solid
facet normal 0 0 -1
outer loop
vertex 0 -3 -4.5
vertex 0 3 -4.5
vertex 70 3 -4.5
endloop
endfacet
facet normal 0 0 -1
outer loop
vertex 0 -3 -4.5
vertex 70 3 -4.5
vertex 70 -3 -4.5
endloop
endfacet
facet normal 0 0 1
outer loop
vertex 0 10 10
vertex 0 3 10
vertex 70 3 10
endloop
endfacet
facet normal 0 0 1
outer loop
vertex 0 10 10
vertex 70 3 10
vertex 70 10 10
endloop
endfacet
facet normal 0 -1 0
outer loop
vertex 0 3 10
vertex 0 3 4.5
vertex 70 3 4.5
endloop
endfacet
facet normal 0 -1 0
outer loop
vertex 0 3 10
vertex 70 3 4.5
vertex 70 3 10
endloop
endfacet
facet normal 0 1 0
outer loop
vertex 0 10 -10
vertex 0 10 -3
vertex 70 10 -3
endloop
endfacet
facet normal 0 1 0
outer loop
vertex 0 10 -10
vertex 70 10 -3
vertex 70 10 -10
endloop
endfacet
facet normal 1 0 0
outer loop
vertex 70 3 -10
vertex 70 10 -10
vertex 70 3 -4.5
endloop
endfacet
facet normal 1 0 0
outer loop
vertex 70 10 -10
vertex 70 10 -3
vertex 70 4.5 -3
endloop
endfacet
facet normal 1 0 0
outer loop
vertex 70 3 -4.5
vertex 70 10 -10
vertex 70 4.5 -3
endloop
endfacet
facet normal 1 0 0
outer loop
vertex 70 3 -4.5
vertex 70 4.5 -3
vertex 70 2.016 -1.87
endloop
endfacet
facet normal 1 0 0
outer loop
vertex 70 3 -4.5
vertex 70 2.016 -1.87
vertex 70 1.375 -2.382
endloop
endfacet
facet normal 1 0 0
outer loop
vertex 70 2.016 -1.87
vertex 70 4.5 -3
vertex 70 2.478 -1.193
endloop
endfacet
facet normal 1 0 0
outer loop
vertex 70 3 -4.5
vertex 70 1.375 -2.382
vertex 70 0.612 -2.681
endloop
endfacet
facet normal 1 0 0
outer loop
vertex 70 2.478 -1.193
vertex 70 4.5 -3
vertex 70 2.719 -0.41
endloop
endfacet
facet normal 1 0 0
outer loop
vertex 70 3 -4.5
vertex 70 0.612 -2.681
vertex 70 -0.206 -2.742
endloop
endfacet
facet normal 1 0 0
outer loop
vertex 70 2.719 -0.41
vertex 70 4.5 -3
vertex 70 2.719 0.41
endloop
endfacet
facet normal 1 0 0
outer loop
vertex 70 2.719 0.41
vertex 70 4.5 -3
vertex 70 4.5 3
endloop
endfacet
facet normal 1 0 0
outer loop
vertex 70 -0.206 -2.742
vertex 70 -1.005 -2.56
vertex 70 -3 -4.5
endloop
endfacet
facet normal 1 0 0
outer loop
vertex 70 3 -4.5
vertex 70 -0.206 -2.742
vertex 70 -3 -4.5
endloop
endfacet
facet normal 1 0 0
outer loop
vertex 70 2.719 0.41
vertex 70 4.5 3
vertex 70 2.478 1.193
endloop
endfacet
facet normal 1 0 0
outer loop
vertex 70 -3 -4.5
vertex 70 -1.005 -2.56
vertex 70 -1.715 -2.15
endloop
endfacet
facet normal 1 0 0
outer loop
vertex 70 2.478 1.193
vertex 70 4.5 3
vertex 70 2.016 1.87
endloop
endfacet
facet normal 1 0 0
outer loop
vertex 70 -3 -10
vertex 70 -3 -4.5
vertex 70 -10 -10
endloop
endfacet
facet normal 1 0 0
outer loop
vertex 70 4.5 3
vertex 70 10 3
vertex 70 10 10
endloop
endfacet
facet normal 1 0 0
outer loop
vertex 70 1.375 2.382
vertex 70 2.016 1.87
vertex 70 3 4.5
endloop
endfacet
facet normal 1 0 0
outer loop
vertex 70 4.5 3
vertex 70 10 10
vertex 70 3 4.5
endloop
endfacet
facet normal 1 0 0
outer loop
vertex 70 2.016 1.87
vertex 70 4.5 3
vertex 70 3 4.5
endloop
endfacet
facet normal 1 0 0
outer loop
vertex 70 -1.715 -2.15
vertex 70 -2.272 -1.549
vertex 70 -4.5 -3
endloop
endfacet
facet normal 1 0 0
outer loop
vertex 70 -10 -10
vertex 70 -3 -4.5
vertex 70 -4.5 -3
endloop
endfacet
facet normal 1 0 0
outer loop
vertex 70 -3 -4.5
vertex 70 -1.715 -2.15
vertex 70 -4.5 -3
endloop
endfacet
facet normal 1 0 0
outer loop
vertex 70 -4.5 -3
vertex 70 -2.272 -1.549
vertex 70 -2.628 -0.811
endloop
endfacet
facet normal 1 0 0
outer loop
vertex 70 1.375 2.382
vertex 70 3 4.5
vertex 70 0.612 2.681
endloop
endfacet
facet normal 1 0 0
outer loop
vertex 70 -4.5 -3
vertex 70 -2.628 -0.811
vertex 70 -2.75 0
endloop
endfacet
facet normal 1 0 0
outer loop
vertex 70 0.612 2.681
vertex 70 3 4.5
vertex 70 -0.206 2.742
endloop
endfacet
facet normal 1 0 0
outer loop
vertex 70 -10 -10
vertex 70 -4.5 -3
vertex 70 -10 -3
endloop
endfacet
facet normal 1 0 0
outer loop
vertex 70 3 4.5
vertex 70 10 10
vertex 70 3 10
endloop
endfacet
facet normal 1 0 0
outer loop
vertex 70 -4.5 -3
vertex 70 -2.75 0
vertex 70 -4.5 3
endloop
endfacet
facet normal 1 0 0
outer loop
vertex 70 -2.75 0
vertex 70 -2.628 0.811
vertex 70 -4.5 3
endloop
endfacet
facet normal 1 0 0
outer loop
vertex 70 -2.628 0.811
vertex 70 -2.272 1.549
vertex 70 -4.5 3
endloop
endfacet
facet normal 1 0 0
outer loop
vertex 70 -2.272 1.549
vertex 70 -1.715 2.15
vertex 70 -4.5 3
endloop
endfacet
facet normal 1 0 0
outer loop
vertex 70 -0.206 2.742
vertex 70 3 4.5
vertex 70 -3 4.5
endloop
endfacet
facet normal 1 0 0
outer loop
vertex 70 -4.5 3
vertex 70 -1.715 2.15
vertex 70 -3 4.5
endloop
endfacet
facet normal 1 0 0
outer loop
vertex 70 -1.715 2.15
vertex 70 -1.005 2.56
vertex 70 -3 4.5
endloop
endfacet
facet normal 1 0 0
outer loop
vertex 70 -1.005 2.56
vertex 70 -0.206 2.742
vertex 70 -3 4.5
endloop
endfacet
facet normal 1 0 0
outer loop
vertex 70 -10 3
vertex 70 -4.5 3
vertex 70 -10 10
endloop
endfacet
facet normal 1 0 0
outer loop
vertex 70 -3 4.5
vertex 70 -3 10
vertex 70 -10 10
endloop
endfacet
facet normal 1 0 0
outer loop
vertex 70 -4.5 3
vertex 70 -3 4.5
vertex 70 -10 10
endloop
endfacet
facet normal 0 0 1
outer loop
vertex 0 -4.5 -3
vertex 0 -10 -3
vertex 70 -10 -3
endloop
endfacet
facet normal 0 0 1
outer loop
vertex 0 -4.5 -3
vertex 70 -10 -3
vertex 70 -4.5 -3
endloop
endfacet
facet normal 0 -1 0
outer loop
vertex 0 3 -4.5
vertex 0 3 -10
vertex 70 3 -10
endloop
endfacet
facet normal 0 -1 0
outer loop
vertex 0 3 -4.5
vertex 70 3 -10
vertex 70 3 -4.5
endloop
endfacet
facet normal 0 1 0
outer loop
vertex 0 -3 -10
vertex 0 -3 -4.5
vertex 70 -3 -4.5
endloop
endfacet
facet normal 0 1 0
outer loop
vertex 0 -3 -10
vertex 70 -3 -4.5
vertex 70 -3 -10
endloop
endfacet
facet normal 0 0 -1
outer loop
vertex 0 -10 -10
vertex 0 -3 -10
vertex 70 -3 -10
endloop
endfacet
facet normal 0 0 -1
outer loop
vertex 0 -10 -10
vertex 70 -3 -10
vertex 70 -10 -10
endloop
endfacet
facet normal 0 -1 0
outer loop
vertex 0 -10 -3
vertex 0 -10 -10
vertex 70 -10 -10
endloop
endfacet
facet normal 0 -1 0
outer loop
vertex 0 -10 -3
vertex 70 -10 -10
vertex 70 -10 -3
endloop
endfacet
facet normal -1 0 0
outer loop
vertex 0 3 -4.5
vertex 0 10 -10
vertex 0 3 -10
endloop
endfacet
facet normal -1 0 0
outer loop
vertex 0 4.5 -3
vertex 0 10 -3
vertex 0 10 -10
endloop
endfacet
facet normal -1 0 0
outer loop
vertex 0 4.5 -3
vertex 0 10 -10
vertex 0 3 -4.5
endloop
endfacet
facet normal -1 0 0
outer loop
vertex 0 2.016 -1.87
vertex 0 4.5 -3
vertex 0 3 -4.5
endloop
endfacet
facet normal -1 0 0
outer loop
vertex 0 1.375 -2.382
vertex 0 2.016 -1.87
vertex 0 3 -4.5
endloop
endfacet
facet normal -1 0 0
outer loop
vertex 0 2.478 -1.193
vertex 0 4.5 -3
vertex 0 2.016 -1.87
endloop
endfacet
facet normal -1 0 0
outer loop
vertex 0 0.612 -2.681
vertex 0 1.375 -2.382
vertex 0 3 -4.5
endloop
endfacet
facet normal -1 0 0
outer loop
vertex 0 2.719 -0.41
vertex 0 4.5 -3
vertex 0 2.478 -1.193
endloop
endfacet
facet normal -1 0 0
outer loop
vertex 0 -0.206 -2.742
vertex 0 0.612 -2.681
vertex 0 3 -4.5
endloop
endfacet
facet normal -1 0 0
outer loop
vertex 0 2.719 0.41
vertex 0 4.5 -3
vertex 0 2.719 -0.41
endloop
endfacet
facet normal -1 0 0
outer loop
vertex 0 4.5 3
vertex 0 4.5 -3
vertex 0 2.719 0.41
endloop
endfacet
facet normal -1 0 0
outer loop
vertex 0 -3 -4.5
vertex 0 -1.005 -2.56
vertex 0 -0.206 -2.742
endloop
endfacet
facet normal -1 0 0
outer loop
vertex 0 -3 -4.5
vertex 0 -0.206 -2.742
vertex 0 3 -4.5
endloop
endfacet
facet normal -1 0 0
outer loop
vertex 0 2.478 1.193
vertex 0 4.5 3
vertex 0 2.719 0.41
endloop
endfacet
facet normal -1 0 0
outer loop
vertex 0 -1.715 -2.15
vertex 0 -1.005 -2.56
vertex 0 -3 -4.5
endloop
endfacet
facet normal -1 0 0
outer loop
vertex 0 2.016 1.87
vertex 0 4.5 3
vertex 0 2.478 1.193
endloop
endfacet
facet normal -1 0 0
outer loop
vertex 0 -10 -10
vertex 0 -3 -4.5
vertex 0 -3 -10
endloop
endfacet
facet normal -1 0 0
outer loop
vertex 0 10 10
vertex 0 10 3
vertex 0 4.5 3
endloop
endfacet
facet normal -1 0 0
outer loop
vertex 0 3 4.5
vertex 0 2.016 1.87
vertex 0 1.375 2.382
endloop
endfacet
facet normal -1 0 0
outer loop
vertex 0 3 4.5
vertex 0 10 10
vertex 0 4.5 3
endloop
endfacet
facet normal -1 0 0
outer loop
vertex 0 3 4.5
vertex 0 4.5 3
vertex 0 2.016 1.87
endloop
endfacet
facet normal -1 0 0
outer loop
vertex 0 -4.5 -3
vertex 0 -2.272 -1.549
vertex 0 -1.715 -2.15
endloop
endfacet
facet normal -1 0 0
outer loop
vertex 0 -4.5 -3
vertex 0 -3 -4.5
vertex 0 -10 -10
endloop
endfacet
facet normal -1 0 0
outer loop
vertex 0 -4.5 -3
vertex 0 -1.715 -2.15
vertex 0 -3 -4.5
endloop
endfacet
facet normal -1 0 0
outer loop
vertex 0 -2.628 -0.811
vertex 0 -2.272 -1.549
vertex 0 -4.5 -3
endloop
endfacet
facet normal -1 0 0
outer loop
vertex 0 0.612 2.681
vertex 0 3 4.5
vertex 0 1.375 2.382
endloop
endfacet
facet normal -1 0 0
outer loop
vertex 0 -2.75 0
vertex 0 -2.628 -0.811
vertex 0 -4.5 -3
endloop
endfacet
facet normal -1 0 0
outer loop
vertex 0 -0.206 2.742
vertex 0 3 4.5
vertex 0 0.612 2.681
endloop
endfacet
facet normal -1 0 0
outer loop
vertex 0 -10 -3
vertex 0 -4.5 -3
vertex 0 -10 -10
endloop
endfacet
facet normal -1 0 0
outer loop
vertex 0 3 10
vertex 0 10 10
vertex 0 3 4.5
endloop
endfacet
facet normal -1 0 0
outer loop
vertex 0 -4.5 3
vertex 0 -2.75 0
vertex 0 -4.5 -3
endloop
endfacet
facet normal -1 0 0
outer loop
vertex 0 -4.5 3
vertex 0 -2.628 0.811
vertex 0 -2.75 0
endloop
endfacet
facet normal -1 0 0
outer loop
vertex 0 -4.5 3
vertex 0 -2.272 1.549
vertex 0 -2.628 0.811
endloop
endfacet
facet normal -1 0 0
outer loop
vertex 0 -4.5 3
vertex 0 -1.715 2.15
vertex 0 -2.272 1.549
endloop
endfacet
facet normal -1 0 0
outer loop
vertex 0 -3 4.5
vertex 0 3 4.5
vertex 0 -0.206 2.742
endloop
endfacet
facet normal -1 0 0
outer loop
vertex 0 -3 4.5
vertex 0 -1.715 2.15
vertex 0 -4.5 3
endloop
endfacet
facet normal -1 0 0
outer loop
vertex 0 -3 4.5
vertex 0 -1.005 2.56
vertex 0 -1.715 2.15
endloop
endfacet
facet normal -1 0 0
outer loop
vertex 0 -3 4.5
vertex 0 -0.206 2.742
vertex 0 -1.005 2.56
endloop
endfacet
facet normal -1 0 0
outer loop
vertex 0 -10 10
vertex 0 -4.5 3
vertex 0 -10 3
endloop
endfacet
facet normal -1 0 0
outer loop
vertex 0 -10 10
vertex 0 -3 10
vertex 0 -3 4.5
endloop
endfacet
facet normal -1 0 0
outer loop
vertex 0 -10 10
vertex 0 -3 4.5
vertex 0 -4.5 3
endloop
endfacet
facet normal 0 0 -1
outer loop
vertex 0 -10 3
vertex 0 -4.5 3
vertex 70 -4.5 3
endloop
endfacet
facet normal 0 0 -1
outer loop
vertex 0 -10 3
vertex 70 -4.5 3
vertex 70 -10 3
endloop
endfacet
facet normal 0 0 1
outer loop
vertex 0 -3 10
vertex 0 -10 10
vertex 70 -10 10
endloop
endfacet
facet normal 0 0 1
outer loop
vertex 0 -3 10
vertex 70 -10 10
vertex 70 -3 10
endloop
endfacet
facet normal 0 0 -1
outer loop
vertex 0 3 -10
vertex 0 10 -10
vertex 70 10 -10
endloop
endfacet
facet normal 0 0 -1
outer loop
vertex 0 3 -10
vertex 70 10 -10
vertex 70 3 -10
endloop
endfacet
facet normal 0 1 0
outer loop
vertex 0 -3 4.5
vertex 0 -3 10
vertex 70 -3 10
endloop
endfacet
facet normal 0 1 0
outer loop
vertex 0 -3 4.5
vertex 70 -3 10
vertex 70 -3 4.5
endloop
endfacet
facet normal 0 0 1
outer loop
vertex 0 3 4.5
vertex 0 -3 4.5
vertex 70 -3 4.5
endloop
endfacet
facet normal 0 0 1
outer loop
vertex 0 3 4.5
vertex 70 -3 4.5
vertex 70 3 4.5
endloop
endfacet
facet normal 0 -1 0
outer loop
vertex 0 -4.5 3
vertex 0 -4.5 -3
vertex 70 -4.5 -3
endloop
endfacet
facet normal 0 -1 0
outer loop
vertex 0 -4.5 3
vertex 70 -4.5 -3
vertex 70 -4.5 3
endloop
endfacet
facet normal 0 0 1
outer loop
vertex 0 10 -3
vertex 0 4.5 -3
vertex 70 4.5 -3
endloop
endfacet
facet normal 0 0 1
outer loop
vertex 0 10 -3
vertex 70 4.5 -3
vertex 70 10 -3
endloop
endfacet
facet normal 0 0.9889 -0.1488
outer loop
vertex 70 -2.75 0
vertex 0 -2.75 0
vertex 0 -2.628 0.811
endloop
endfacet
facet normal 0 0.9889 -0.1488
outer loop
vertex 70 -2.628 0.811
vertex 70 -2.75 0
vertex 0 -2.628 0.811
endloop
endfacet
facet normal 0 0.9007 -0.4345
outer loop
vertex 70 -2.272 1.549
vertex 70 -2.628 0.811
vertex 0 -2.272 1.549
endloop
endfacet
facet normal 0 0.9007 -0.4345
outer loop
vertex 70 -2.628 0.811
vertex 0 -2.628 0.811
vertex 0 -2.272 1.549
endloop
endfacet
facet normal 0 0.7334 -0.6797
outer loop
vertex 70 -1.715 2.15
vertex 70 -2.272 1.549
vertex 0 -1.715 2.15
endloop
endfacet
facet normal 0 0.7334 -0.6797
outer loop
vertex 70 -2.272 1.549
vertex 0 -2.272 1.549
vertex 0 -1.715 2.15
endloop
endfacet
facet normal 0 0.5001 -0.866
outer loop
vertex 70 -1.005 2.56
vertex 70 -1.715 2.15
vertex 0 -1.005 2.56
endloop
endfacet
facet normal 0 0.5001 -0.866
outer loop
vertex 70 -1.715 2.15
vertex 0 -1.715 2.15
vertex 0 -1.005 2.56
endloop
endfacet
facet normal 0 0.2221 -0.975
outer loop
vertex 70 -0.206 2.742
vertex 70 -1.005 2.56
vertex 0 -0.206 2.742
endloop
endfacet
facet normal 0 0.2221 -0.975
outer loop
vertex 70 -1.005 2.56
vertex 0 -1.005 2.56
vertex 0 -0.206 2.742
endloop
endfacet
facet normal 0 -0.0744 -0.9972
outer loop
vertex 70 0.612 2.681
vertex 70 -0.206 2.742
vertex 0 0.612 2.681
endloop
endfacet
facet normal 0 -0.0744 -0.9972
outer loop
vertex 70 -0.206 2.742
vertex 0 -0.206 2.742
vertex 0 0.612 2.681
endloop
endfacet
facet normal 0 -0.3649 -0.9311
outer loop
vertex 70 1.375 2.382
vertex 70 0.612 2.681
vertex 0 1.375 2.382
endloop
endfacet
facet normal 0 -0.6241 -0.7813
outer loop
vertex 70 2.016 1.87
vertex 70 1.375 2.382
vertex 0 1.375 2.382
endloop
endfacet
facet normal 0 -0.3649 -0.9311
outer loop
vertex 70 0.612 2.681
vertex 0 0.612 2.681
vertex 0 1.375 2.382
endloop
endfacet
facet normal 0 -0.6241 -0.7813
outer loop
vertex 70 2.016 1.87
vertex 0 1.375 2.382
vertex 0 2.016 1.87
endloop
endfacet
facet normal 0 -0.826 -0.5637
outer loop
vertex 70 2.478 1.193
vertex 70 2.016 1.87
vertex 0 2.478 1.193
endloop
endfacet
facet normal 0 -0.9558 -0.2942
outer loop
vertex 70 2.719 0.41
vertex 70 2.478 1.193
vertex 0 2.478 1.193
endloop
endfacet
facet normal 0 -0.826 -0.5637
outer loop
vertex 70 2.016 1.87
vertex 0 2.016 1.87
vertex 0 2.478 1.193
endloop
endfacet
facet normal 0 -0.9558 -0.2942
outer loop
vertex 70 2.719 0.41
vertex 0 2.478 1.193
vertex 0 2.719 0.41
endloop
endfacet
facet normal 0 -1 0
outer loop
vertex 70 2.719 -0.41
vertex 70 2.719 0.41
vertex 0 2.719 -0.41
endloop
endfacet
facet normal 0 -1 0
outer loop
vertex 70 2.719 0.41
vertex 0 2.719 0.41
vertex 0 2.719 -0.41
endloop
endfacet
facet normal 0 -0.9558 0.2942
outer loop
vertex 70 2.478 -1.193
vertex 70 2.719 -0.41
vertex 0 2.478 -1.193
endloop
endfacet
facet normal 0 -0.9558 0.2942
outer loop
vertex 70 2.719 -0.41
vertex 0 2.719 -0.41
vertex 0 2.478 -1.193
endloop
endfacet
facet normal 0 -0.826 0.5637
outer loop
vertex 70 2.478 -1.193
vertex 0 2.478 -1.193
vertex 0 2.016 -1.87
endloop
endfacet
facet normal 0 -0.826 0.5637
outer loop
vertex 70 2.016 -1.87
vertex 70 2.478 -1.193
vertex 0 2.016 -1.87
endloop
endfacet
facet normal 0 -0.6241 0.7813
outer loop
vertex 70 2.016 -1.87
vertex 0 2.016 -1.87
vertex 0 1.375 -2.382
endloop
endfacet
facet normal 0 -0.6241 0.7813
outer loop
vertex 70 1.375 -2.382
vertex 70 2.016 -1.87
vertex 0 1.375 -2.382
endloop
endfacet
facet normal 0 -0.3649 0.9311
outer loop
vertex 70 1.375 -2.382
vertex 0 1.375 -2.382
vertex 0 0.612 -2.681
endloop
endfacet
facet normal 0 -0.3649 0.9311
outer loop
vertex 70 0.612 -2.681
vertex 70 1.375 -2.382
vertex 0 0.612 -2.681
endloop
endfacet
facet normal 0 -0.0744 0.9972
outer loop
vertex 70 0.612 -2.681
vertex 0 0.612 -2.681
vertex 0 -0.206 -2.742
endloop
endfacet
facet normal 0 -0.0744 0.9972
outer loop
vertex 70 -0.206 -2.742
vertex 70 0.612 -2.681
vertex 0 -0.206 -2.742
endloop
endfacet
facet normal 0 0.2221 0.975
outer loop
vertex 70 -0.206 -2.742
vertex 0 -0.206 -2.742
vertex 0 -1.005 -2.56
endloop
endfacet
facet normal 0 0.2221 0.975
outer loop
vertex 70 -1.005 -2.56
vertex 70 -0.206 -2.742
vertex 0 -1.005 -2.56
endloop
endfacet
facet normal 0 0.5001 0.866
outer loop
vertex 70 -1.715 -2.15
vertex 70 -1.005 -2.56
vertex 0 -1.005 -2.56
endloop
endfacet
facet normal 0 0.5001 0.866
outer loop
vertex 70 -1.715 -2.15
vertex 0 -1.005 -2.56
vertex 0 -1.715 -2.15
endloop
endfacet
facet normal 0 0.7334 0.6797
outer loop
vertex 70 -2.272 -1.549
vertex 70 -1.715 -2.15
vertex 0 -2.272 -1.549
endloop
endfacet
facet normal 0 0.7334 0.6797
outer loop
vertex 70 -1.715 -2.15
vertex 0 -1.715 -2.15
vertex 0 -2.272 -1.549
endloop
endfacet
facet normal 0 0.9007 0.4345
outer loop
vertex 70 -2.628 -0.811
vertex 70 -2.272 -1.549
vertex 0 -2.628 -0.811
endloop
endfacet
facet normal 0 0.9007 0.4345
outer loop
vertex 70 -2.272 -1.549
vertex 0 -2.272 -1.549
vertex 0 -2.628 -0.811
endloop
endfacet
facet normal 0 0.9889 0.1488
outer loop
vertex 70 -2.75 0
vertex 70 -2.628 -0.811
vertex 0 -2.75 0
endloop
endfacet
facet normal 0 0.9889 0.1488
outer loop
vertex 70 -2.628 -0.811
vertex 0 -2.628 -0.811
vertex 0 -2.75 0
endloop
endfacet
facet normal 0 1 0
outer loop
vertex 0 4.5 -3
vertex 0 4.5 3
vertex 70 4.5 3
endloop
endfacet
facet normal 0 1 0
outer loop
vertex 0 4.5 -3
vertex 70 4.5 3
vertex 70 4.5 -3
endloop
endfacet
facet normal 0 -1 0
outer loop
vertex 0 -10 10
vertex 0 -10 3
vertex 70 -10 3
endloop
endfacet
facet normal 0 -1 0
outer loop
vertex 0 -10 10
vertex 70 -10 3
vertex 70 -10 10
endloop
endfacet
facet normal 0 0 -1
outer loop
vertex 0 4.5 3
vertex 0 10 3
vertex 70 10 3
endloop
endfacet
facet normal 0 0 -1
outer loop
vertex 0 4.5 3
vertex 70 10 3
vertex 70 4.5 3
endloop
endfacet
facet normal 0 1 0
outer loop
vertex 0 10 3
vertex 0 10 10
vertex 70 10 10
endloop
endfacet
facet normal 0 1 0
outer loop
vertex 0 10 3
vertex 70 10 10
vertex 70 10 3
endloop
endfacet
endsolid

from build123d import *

# Parameters (mm, degrees)
ESQUISSE1_R        = 2.75
BOSS_EXTRU_1_DEPTH = 70


with BuildPart() as part:
    # Esquisse1 → Boss.-Extru.1 (new body)
    with BuildSketch(Plane(origin=(0, 0, 0), x_dir=(0, -1, 0), z_dir=(-1, 0, 0))):
        Polygon((-3, -10), (-3, -4.5), (3, -4.5), (3, -10), (10, -10), (10, -3), (4.5, -3), (4.5, 3), (10, 3), (10, 10), (3, 10), (3, 4.5), (-3, 4.5), (-3, 10), (-10, 10), (-10, 3), (-4.5, 3), (-4.5, -3), (-10, -3), (-10, -10), align=None)
        Circle(ESQUISSE1_R, mode=Mode.SUBTRACT)
    extrude(amount=-BOSS_EXTRU_1_DEPTH)


solid = part.part
